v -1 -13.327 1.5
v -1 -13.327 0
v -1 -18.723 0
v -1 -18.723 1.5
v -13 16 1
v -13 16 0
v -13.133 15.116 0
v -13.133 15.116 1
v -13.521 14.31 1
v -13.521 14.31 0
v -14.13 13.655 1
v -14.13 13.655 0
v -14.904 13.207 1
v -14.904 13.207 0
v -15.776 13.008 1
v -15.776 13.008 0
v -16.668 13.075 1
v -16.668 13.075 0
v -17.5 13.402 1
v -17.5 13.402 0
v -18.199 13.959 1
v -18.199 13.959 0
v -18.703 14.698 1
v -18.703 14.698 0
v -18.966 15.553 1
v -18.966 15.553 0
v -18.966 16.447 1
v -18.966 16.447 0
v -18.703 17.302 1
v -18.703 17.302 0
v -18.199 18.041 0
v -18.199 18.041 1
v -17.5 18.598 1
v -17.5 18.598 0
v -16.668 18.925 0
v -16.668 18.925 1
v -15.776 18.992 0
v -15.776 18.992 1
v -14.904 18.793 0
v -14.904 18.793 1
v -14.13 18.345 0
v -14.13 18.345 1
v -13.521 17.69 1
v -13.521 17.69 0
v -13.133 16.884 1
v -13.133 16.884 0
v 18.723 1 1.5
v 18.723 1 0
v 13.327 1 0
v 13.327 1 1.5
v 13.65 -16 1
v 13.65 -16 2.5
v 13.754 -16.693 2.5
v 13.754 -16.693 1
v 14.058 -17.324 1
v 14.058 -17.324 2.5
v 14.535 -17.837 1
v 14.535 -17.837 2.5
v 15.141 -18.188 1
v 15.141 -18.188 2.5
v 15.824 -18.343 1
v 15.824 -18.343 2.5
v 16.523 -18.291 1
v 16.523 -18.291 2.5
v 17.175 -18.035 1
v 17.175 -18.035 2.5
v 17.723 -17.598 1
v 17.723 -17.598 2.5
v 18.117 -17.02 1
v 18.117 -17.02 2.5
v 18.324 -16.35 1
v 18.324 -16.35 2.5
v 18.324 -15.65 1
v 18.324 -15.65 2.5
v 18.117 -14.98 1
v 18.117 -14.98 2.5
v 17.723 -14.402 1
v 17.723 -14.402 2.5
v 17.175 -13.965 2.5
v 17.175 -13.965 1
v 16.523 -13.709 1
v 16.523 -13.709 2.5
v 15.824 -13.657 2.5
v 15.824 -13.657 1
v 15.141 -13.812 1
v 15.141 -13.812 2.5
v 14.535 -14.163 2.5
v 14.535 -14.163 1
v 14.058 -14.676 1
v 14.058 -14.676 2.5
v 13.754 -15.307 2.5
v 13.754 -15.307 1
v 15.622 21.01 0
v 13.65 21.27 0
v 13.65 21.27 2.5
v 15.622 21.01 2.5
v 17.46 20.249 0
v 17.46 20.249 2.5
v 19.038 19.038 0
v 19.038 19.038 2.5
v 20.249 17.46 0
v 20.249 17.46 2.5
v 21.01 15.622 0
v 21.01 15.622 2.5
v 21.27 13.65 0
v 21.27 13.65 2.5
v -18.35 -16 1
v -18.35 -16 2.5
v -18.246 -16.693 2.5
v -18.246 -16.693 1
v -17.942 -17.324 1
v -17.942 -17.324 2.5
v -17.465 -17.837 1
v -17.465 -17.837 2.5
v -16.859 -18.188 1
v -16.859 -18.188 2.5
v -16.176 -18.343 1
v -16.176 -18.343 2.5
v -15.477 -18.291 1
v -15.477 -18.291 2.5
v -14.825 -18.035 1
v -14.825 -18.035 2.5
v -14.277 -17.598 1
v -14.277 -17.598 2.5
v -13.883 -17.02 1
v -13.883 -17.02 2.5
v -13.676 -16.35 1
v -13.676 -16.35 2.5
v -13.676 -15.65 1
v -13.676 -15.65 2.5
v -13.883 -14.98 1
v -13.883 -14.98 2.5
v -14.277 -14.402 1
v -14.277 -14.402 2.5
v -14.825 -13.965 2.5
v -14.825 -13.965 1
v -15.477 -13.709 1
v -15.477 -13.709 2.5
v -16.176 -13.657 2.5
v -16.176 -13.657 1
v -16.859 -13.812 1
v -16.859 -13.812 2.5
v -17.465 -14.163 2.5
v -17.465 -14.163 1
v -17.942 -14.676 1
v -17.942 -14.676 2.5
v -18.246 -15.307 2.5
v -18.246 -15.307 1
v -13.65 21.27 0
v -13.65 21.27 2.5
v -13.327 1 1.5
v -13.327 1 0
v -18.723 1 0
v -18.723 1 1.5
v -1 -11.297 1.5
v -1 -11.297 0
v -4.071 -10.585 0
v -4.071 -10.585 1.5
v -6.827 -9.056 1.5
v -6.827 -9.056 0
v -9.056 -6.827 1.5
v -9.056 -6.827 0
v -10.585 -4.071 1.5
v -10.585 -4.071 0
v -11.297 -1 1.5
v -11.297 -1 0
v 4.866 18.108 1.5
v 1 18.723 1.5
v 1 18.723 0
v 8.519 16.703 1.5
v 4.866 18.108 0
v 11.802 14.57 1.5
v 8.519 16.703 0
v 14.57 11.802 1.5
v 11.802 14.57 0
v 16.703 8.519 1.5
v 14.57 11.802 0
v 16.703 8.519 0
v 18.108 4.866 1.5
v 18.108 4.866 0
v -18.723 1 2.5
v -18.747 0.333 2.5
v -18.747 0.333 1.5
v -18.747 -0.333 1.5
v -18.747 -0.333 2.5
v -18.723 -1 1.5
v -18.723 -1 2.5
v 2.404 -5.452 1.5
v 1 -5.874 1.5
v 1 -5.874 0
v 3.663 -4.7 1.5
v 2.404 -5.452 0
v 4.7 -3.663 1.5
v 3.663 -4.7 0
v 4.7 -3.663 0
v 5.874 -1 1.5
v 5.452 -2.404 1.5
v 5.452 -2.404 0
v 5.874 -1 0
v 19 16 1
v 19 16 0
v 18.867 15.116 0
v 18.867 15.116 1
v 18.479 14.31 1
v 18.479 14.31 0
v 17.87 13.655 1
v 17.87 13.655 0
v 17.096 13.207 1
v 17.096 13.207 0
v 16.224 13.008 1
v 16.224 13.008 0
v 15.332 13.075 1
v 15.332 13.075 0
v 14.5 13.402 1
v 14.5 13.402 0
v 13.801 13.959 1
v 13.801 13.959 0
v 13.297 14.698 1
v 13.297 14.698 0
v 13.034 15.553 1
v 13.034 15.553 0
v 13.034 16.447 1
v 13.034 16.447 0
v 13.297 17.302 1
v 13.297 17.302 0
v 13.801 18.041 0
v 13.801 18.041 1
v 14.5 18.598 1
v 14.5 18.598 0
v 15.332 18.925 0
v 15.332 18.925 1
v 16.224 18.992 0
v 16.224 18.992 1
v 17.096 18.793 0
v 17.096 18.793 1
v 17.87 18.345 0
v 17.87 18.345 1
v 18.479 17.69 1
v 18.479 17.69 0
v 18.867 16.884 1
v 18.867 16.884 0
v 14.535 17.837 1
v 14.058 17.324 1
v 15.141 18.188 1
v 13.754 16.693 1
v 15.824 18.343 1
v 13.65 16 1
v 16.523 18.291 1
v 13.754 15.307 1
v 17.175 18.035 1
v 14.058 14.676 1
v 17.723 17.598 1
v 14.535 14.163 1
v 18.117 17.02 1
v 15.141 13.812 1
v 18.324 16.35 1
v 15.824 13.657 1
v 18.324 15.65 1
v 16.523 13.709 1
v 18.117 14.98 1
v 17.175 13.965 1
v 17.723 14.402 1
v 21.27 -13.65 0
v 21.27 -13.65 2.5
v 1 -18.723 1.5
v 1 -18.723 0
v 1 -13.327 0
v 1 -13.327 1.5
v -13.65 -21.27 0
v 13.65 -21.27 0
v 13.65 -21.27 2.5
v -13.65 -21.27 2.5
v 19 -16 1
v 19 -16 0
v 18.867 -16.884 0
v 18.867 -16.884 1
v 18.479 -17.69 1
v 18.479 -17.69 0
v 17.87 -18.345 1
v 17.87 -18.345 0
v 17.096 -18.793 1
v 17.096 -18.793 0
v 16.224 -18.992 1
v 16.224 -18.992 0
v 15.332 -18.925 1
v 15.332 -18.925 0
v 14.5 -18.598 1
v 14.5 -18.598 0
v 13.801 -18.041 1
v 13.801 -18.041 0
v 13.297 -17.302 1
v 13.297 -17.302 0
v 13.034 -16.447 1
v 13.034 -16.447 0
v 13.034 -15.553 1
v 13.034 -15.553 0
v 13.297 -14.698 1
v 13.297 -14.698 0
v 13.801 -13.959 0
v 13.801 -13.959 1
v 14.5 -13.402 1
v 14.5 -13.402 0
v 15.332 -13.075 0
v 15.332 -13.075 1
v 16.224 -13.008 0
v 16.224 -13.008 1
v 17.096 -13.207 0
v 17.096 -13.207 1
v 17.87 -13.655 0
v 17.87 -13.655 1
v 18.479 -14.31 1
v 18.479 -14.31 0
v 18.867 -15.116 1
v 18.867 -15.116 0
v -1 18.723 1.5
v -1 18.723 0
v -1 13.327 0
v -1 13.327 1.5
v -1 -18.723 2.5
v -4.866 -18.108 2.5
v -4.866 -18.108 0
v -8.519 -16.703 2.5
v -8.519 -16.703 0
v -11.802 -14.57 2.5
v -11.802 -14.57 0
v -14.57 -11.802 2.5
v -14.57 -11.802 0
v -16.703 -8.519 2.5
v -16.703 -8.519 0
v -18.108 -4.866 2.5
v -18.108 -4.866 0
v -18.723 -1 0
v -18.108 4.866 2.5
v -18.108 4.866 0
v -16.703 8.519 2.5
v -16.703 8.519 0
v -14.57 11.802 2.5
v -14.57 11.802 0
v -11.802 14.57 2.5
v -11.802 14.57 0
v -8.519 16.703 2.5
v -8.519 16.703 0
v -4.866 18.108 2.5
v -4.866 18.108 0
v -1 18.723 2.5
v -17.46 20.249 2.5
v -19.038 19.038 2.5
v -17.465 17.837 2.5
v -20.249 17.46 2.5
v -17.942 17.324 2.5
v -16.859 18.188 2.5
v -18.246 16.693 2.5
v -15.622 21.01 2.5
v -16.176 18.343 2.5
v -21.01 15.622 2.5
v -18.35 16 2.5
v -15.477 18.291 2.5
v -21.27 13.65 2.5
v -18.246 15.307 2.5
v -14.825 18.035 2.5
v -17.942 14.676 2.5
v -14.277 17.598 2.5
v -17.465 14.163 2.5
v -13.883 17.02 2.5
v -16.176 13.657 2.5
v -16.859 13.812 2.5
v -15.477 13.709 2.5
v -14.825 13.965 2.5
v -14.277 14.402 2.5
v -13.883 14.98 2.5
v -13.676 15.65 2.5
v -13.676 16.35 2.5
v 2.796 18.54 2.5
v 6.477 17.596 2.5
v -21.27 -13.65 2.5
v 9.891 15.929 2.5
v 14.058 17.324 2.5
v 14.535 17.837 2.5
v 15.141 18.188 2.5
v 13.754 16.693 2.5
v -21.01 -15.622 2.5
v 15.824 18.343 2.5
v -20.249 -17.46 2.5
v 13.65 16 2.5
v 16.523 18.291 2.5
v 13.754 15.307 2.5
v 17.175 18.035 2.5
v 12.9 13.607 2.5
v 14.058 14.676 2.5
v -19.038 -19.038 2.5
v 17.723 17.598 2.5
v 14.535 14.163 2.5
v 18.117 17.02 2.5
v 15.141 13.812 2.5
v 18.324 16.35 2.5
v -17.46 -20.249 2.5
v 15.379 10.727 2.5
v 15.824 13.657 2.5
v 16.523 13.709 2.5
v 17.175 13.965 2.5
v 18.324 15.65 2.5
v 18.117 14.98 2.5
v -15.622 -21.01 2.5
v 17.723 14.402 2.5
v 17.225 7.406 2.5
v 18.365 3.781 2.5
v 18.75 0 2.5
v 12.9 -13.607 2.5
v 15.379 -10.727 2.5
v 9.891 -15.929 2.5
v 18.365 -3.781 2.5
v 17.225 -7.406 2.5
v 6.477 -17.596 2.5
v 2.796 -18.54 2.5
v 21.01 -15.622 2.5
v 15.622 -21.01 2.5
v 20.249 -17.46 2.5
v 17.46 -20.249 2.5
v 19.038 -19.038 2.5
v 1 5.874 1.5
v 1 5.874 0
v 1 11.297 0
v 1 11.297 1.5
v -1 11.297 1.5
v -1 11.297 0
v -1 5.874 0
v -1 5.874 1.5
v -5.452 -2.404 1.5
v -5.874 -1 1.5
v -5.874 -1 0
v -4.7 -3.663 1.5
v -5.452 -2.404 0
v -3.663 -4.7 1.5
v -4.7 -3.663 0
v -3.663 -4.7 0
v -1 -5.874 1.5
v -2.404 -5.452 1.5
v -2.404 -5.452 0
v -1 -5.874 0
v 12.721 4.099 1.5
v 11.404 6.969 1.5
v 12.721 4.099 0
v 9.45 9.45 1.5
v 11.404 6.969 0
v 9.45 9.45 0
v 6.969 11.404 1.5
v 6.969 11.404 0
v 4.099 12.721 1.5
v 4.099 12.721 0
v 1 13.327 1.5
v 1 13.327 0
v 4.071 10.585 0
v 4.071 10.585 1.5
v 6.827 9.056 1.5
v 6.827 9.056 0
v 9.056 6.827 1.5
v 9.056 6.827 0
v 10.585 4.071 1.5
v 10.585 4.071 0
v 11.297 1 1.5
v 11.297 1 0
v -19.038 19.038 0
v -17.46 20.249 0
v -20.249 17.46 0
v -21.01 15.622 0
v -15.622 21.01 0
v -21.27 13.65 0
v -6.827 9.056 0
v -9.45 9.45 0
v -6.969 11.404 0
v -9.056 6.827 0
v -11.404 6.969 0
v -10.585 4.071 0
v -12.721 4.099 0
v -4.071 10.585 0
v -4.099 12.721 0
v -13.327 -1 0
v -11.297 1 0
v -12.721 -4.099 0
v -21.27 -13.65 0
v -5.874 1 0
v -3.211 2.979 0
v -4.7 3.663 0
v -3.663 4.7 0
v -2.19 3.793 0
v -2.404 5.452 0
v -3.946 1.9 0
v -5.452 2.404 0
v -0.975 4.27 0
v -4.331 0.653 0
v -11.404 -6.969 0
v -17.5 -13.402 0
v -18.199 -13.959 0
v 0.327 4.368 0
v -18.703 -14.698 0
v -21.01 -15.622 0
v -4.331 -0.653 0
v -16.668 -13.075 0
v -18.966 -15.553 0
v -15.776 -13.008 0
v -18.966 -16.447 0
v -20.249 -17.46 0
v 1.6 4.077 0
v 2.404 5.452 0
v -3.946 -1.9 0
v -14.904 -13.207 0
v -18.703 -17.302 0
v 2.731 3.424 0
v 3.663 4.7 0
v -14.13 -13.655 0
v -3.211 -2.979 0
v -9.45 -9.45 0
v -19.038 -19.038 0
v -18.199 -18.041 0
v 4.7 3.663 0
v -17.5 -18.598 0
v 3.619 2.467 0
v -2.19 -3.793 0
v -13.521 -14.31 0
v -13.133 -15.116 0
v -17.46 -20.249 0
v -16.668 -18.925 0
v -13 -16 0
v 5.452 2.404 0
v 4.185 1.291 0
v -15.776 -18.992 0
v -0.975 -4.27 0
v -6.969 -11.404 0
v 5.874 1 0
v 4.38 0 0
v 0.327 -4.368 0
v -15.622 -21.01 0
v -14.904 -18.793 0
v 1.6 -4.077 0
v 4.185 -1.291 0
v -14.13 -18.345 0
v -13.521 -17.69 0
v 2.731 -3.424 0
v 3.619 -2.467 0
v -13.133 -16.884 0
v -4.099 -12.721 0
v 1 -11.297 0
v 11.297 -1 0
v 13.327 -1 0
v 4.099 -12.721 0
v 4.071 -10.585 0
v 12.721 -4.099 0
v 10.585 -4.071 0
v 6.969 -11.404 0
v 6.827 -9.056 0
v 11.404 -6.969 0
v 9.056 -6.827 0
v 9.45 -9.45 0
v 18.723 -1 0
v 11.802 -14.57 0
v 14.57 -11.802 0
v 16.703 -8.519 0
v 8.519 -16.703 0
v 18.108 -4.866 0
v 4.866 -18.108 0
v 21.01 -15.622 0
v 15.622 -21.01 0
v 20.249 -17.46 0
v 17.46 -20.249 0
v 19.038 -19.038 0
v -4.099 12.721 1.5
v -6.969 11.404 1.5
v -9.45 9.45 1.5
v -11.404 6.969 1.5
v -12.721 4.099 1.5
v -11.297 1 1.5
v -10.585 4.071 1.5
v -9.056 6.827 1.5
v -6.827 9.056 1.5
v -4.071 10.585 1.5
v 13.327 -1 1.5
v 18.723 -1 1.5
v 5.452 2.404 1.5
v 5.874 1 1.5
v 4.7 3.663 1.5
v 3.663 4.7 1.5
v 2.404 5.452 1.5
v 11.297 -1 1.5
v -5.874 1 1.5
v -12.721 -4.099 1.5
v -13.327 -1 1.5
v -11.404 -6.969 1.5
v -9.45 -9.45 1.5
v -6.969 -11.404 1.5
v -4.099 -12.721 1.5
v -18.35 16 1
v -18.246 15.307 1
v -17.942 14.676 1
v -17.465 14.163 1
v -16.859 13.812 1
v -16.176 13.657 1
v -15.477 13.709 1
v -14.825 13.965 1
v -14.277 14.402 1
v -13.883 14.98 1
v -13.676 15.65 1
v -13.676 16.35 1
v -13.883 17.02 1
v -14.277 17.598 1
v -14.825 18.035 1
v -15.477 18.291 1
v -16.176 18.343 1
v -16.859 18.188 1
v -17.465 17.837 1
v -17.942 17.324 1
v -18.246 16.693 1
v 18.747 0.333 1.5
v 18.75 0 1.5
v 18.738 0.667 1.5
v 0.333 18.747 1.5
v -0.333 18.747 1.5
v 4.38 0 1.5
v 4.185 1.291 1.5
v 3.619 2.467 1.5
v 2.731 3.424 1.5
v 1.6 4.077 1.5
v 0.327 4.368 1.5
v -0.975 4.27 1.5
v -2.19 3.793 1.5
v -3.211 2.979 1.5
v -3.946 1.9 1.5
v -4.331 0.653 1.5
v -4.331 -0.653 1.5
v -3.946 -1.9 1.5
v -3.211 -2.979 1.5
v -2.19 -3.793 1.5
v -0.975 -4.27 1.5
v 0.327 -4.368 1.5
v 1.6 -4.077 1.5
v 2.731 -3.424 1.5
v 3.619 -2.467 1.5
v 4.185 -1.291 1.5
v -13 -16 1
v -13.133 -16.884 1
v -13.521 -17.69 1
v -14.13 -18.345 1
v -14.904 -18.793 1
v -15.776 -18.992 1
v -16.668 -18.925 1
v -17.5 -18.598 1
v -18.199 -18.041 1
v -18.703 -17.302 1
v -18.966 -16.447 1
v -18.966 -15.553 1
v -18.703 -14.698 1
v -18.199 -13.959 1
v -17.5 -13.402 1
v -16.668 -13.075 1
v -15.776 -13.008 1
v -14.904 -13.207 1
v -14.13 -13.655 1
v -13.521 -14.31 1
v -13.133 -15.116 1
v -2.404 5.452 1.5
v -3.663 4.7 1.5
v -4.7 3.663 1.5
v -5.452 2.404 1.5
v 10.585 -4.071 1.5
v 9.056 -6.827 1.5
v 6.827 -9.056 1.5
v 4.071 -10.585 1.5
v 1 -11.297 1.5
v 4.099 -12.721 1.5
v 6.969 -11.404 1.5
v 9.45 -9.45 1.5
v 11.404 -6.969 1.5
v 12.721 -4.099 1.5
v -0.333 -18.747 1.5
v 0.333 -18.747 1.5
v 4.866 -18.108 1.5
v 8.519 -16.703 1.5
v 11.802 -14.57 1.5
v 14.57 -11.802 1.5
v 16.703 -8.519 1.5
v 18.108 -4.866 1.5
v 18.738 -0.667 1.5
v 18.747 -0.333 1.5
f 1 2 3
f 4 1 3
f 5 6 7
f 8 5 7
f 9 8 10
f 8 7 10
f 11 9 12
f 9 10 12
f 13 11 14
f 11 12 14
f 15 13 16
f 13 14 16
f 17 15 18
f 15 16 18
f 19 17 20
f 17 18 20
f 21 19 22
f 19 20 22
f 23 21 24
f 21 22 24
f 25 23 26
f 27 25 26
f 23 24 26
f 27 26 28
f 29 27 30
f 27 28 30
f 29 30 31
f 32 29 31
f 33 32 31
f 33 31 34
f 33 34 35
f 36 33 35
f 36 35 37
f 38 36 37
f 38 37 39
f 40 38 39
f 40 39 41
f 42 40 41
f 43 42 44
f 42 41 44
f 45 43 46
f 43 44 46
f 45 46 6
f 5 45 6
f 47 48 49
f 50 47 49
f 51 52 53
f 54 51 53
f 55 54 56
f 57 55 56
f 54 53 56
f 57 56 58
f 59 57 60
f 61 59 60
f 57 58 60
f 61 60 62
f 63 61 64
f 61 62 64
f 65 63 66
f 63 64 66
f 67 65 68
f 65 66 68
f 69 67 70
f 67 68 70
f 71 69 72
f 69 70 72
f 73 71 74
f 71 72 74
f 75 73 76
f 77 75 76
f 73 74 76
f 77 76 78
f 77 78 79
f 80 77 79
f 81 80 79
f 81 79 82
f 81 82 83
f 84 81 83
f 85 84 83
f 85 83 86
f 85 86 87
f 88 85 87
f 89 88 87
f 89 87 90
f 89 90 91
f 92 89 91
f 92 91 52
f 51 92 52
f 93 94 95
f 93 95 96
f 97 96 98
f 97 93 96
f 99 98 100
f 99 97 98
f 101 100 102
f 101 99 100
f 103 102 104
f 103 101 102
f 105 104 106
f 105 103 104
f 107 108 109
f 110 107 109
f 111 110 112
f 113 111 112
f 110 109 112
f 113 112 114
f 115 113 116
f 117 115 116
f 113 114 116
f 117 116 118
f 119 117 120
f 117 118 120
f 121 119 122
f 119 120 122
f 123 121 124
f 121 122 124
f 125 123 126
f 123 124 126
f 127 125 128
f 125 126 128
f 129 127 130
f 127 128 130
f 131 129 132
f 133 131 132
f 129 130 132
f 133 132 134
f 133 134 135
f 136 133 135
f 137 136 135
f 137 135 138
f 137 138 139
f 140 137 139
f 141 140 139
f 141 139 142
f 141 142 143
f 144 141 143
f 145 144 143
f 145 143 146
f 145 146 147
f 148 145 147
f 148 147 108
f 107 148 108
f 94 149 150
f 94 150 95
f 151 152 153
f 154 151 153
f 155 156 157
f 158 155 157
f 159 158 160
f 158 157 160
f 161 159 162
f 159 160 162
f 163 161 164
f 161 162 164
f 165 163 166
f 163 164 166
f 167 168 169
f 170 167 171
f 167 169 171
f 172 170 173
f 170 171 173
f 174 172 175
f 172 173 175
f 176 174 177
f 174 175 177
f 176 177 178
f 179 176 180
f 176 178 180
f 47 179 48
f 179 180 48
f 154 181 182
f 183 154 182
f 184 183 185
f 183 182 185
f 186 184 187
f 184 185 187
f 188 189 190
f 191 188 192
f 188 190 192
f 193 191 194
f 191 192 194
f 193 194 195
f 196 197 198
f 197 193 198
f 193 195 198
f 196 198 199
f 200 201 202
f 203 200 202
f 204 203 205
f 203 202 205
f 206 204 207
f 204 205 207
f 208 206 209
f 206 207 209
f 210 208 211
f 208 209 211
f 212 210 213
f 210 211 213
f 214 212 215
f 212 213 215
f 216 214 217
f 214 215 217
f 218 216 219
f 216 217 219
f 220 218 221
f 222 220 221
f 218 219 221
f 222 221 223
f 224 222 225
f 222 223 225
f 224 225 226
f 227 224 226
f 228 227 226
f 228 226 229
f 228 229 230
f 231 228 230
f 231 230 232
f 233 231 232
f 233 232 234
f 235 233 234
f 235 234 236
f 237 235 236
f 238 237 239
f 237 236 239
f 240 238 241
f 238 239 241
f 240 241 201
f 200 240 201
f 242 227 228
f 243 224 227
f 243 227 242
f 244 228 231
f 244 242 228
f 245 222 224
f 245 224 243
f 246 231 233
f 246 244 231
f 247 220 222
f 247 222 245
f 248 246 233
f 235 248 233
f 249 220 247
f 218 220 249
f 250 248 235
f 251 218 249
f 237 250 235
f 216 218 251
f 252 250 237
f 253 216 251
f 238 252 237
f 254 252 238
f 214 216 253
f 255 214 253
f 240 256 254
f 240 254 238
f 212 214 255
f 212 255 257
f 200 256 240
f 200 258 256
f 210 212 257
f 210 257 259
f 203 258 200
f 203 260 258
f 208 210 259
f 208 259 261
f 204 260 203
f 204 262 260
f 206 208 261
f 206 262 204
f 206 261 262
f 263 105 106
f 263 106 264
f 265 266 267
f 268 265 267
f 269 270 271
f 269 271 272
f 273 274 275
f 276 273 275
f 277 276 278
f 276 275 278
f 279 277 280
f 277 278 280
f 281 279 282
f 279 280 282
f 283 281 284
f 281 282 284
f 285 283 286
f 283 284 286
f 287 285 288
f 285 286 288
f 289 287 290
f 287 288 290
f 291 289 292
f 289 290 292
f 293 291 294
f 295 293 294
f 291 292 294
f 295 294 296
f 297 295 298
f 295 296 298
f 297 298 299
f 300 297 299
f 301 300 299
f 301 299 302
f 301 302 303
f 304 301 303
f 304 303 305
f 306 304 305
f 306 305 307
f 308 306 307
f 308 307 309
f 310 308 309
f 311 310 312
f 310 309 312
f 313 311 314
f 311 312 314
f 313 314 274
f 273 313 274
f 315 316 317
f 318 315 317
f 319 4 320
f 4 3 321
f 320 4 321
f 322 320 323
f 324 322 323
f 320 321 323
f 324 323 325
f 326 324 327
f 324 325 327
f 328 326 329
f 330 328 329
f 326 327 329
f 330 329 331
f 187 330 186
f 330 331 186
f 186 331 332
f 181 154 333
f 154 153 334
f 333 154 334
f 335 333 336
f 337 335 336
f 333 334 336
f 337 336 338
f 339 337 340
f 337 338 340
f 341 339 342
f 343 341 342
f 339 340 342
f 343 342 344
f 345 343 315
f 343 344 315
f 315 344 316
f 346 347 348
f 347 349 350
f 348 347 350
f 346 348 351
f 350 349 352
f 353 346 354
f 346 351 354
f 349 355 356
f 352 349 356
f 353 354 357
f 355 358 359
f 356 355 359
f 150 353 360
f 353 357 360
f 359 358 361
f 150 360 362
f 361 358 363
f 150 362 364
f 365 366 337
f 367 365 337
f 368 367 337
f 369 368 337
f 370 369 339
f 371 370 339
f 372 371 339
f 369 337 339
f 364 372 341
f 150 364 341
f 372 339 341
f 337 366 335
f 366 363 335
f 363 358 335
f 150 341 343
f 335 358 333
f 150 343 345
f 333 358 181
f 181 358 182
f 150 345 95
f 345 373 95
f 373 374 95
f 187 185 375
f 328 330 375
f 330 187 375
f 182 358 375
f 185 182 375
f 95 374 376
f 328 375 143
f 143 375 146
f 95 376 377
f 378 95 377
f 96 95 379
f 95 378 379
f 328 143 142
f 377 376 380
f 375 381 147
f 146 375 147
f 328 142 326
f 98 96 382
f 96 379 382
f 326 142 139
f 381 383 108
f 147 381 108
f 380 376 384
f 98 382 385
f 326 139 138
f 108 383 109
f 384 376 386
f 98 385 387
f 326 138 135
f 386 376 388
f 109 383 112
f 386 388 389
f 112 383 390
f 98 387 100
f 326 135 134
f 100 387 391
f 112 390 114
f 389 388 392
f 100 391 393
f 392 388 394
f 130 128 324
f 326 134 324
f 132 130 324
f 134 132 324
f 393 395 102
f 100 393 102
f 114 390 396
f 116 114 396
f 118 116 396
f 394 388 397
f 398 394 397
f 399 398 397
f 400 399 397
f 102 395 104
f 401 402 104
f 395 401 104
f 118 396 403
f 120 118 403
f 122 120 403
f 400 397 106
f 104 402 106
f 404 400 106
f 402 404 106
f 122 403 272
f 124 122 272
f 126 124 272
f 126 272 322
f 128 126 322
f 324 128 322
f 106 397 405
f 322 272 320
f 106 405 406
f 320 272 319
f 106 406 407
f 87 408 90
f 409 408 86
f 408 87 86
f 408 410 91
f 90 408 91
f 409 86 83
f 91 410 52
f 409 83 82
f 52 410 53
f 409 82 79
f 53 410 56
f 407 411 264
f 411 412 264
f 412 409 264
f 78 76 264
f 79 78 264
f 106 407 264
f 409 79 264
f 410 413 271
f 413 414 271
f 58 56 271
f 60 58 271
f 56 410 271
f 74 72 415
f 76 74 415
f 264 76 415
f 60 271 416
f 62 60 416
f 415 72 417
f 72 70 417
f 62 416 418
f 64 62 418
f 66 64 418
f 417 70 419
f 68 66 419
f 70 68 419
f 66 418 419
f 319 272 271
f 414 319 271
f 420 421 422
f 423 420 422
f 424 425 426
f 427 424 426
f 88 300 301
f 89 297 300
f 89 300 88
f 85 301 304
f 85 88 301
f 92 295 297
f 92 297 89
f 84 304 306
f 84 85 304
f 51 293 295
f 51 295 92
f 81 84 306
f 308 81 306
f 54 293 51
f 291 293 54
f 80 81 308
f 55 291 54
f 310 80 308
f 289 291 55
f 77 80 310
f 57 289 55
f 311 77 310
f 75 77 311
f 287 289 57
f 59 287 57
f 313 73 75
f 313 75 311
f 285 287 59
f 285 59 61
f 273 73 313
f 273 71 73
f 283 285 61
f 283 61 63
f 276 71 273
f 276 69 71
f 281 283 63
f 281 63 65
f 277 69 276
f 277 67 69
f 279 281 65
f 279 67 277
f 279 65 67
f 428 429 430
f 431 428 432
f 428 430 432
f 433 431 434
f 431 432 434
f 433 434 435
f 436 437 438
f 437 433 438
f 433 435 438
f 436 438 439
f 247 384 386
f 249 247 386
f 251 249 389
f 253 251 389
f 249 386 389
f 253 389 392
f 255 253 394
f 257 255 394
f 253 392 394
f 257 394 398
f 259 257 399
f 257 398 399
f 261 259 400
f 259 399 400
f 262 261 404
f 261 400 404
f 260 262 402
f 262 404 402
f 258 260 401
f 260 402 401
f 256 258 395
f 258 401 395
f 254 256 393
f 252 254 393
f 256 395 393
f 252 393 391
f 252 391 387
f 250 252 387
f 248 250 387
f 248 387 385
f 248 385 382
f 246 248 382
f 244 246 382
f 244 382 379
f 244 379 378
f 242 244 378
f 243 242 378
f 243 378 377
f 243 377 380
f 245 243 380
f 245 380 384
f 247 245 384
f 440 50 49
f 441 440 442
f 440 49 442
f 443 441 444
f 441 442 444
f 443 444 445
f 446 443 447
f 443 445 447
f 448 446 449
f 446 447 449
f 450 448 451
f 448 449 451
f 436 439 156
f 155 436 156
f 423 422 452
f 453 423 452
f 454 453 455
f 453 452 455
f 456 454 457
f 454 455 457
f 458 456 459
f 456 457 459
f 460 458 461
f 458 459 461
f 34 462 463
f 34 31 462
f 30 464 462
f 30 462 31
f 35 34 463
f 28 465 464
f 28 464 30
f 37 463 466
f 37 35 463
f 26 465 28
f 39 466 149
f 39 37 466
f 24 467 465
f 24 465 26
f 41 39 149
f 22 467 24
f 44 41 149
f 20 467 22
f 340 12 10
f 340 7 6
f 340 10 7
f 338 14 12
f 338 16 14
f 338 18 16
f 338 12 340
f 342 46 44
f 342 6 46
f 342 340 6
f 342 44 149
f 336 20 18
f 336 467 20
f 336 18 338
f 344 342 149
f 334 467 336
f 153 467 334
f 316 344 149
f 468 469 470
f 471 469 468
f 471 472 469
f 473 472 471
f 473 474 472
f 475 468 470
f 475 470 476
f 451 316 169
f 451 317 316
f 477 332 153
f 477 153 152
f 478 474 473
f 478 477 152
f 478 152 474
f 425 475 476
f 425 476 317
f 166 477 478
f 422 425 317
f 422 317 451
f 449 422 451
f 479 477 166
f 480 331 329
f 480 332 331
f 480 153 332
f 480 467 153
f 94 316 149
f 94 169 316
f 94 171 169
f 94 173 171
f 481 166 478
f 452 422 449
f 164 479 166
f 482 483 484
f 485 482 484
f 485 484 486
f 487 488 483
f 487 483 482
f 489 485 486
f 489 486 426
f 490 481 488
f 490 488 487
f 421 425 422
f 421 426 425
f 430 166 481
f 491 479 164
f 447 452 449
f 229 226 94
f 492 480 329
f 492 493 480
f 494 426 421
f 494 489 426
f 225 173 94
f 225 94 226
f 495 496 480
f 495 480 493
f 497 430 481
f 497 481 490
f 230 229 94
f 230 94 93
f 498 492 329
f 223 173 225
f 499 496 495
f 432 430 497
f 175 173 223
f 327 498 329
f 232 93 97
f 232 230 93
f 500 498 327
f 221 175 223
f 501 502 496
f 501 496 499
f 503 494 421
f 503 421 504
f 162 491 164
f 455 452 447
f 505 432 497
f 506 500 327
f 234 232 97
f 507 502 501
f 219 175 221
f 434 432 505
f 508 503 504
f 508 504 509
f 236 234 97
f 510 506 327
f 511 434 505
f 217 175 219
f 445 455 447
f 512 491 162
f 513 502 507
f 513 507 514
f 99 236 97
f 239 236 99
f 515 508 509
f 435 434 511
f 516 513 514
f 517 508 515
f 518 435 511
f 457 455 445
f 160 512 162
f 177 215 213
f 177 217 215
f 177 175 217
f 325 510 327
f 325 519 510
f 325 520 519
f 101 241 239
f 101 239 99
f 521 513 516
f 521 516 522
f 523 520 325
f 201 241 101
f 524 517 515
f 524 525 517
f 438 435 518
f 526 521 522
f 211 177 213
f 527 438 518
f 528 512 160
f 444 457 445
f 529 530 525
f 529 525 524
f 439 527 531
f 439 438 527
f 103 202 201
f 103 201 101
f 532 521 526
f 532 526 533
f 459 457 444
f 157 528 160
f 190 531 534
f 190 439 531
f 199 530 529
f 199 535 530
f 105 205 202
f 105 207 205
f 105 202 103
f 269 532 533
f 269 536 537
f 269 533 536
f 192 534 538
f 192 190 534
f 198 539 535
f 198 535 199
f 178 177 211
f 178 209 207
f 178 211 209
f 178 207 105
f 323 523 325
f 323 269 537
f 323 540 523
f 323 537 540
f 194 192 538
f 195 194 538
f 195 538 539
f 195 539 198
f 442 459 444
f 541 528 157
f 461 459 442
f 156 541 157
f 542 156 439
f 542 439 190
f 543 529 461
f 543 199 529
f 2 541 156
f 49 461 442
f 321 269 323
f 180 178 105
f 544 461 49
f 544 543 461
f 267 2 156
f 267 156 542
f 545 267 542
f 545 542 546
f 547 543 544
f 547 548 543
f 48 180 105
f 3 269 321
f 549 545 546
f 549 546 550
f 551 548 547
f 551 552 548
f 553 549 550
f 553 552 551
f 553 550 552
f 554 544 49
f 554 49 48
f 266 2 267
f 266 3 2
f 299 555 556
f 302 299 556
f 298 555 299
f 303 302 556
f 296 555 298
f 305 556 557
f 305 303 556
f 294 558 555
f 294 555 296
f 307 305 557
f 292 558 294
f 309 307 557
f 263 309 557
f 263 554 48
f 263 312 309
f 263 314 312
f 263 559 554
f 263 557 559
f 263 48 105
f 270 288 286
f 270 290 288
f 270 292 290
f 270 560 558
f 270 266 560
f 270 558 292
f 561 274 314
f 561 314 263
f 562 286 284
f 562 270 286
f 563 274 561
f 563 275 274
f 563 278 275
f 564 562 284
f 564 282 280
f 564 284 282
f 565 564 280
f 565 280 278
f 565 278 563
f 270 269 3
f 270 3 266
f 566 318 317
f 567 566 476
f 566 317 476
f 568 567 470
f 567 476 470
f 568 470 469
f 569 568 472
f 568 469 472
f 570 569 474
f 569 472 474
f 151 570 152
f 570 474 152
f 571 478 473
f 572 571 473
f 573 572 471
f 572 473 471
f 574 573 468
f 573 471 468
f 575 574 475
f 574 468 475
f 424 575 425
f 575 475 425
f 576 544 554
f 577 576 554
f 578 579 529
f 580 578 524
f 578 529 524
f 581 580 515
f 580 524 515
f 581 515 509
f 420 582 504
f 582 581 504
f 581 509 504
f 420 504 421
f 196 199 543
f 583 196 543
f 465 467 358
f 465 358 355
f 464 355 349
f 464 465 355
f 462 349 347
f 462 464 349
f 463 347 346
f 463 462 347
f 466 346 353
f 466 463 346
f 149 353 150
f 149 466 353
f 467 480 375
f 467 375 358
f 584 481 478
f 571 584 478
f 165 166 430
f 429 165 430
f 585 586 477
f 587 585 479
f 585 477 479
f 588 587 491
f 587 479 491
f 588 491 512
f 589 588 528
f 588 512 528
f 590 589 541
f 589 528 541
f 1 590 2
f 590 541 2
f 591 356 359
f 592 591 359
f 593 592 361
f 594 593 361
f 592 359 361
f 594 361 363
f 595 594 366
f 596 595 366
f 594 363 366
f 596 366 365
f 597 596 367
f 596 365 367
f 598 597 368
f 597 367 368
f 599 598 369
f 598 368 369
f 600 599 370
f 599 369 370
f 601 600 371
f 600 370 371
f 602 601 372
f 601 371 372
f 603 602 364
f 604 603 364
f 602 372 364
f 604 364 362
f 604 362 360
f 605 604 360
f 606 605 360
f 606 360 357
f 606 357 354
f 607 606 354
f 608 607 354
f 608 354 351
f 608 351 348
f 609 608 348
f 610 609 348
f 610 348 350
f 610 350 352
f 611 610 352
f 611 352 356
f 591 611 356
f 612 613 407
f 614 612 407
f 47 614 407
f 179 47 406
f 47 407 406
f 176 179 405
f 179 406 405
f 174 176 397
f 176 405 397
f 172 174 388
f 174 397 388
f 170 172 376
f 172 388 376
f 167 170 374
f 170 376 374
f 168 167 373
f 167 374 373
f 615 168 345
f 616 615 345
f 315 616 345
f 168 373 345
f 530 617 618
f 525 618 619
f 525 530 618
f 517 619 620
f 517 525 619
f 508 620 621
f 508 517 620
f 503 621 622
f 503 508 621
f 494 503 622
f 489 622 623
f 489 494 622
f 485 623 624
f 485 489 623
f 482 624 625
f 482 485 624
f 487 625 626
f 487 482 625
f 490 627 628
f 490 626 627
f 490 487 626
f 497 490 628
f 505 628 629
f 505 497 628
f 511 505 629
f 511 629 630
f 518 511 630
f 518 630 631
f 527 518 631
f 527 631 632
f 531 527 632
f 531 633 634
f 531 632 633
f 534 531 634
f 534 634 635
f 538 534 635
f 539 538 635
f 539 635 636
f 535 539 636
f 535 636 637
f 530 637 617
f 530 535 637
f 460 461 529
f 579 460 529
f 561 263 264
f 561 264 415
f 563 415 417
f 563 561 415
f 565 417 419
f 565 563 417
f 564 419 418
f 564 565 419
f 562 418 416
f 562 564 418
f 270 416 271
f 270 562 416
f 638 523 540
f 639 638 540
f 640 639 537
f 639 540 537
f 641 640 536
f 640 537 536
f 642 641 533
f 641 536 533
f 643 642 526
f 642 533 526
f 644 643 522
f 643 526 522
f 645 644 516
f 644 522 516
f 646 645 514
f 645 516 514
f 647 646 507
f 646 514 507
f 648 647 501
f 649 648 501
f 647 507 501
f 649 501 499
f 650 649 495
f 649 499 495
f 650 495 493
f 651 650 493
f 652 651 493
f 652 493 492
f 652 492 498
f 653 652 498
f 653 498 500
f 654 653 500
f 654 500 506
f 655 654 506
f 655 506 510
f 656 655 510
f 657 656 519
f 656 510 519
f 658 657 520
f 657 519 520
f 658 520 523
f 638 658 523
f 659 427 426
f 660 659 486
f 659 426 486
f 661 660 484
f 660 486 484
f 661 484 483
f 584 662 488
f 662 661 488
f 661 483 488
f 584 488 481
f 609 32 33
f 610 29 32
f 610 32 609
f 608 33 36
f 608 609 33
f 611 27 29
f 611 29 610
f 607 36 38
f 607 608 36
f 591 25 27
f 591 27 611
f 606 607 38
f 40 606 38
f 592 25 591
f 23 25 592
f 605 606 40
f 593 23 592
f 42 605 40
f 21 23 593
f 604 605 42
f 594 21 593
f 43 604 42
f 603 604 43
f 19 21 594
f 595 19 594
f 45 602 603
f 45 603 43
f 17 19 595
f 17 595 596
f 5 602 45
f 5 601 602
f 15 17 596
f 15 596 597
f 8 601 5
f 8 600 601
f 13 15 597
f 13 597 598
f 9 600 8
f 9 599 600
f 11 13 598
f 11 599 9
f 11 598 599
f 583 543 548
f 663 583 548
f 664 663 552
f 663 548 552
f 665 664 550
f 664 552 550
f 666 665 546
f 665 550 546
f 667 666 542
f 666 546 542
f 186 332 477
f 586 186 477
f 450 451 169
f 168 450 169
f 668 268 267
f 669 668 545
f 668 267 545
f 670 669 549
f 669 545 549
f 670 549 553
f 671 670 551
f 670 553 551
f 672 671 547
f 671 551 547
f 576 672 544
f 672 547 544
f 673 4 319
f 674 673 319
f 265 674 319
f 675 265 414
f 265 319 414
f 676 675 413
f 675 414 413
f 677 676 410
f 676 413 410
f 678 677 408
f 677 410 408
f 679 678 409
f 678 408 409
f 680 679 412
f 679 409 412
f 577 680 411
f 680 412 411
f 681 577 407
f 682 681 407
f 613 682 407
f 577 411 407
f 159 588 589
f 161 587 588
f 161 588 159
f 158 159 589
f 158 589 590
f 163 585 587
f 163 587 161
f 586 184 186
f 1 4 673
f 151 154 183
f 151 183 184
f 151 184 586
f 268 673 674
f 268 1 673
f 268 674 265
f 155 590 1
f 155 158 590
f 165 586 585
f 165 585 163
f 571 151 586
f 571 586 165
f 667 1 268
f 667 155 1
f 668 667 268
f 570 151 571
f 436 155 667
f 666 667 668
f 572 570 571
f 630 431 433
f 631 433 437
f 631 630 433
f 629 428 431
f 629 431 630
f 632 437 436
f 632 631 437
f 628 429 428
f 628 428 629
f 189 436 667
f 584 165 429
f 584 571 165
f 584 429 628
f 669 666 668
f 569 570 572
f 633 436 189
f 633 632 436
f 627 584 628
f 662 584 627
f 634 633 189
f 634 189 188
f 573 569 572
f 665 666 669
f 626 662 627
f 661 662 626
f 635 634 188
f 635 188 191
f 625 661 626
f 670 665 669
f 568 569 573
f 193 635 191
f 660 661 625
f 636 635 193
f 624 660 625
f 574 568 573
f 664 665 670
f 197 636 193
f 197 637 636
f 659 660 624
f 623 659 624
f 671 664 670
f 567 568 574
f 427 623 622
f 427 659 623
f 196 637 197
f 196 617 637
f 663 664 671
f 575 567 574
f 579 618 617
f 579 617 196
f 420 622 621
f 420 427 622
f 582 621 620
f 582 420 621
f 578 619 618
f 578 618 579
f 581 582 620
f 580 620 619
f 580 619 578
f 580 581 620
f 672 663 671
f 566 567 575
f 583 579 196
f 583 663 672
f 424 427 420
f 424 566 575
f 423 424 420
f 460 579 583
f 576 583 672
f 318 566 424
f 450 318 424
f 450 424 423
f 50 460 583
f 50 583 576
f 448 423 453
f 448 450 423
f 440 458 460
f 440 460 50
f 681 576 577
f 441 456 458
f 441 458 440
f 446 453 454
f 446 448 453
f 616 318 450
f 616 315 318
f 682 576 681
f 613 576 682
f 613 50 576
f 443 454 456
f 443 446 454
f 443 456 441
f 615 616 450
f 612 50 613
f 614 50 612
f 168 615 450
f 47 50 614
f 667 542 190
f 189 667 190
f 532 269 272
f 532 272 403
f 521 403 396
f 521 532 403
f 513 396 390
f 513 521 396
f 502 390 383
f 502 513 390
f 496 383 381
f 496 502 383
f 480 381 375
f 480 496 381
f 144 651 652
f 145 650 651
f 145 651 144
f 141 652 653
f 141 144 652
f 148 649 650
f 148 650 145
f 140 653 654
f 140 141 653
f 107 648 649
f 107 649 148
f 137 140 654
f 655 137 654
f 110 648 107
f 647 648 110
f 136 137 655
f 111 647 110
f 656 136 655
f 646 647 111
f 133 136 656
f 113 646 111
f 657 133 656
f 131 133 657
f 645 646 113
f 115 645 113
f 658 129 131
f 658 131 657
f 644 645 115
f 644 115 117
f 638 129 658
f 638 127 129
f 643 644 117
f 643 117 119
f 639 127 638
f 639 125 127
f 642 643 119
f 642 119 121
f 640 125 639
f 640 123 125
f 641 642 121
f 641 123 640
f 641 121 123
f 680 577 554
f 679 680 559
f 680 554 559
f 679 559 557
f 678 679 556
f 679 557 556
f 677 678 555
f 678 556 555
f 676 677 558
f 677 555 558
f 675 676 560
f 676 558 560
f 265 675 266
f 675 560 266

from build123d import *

# Parameters (mm, degrees)
F0_R     = 1.6
F0_R_2   = 4.38006
F1_DEPTH = 2.5
F3_DEPTH = 1
F4_R     = 3
F4_R_2   = 1.6
F5_DEPTH = 1
F7_DEPTH = 2.5
F8_R     = 1.7
F9_DEPTH = 2.501
F10_D    = 4.7


with BuildPart() as f1:
    # F0 (on Top) → F1 (new body)
    with BuildSketch(Plane.XY):
        with BuildLine():
            Line((13.65, 20), (-13.65, 20))
            ThreePointArc((-13.65, 20), (-18.140128, 18.140128), (-20, 13.65))
            Line((-20, 13.65), (-20, -13.65))
            ThreePointArc((-20, -13.65), (-18.140128, -18.140128), (-13.65, -20))
            Line((-13.65, -20), (13.65, -20))
            ThreePointArc((13.65, -20), (18.140128, -18.140128), (20, -13.65))
            Line((20, -13.65), (20, 13.65))
            ThreePointArc((20, 13.65), (18.140128, 18.140128), (13.65, 20))
        make_face()
        with Locations((-16, -16)):
            Circle(F0_R, mode=Mode.SUBTRACT)
        with BuildLine():
            ThreePointArc((-1, -18.723314), (-13.258252, -13.258252), (-18.723314, -1))
            Line((-18.723314, -1), (-13.327216, -1))
            ThreePointArc((-13.327216, -1), (-9.450256, -9.450256), (-1, -13.327216))
            Line((-1, -13.327216), (-1, -18.723314))
        make_face(mode=Mode.SUBTRACT)
        with BuildLine():
            ThreePointArc((-5.873836, -1), (-4.213191, -4.213191), (-1, -5.873836))
            Line((-1, -5.873836), (-1, -11.296782))
            ThreePointArc((-1, -11.296782), (-8.019267, -8.019267), (-11.296782, -1))
            Line((-11.296782, -1), (-5.873836, -1))
        make_face(mode=Mode.SUBTRACT)
        with Locations((16, -16)):
            Circle(F0_R, mode=Mode.SUBTRACT)
        with BuildLine():
            ThreePointArc((18.723314, -1), (13.258252, -13.258252), (1, -18.723314))
            Line((1, -18.723314), (1, -13.327216))
            ThreePointArc((1, -13.327216), (9.450256, -9.450256), (13.327216, -1))
            Line((13.327216, -1), (18.723314, -1))
        make_face(mode=Mode.SUBTRACT)
        with BuildLine():
            ThreePointArc((1, -5.873836), (4.213191, -4.213191), (5.873836, -1))
            Line((5.873836, -1), (11.296782, -1))
            ThreePointArc((11.296782, -1), (8.019267, -8.019267), (1, -11.296782))
            Line((1, -11.296782), (1, -5.873836))
        make_face(mode=Mode.SUBTRACT)
        with BuildLine():
            ThreePointArc((-11.296782, 1), (-8.019267, 8.019267), (-1, 11.296782))
            Line((-1, 11.296782), (-1, 5.873836))
            ThreePointArc((-1, 5.873836), (-4.213191, 4.213191), (-5.873836, 1))
            Line((-5.873836, 1), (-11.296782, 1))
        make_face(mode=Mode.SUBTRACT)
        with BuildLine():
            ThreePointArc((-18.723314, 1), (-13.258252, 13.258252), (-1, 18.723314))
            Line((-1, 18.723314), (-1, 13.327216))
            ThreePointArc((-1, 13.327216), (-9.450256, 9.450256), (-13.327216, 1))
            Line((-13.327216, 1), (-18.723314, 1))
        make_face(mode=Mode.SUBTRACT)
        with Locations((-16, 16)):
            Circle(F0_R, mode=Mode.SUBTRACT)
        Circle(F0_R_2, mode=Mode.SUBTRACT)
        with BuildLine():
            Line((11.296782, 1), (5.873836, 1))
            ThreePointArc((5.873836, 1), (4.213191, 4.213191), (1, 5.873836))
            Line((1, 5.873836), (1, 11.296782))
            ThreePointArc((1, 11.296782), (8.019267, 8.019267), (11.296782, 1))
        make_face(mode=Mode.SUBTRACT)
        with BuildLine():
            Line((1, 13.327216), (1, 18.723314))
            ThreePointArc((1, 18.723314), (13.258252, 13.258252), (18.723314, 1))
            Line((18.723314, 1), (13.327216, 1))
            ThreePointArc((13.327216, 1), (9.450256, 9.450256), (1, 13.327216))
        make_face(mode=Mode.SUBTRACT)
        with Locations((16, 16)):
            Circle(F0_R, mode=Mode.SUBTRACT)
    extrude(amount=F1_DEPTH)

    # F2 (on face) → F3 (cut)
    with BuildSketch(Plane.XY.offset(2.5)):
        with BuildLine():
            ThreePointArc((18.75, 0), (12.899855, 13.607213), (-1, 18.723314))
            ThreePointArc((-1, 18.723314), (-13.258252, 13.258252), (-18.723314, 1))
            ThreePointArc((-18.723314, 1), (-18.75, 0), (-18.723314, -1))
            ThreePointArc((-18.723314, -1), (-13.258252, -13.258252), (-1, -18.723314))
            ThreePointArc((-1, -18.723314), (12.899855, -13.607213), (18.75, 0))
        make_face()
    extrude(amount=-F3_DEPTH, mode=Mode.SUBTRACT)

    # F4 (on face) → F5 (cut)
    with BuildSketch(Plane(origin=(0, 0, 0), x_dir=(1, 0, 0), z_dir=(0, 0, -1))):
        with Locations((-16, 16)):
            Circle(F4_R)
        with Locations((-16, 16)):
            Circle(F4_R_2, mode=Mode.SUBTRACT)
        with Locations((16, 16)):
            Circle(F4_R)
        with Locations((16, 16)):
            Circle(F4_R_2, mode=Mode.SUBTRACT)
        with Locations((16, -16)):
            Circle(F4_R)
        with Locations((16, -16)):
            Circle(F4_R_2, mode=Mode.SUBTRACT)
        with Locations((-16, -16)):
            Circle(F4_R)
        with Locations((-16, -16)):
            Circle(F4_R_2, mode=Mode.SUBTRACT)
    extrude(amount=-F5_DEPTH, mode=Mode.SUBTRACT)

    # F6 (on face) → F7 (join, through all)
    with BuildSketch(Plane(origin=(0, 0, 0), x_dir=(1, 0, 0), z_dir=(0, 0, -1))):
        with BuildLine():
            ThreePointArc((-13.65, 21.27), (-19.038154, 19.038154), (-21.27, 13.65))
            Line((-21.27, 13.65), (-21.27, -13.65))
            ThreePointArc((-21.27, -13.65), (-19.038154, -19.038154), (-13.65, -21.27))
            Line((-13.65, -21.27), (13.65, -21.27))
            ThreePointArc((13.65, -21.27), (19.038154, -19.038154), (21.27, -13.65))
            Line((21.27, -13.65), (21.27, 13.65))
            ThreePointArc((21.27, 13.65), (19.038154, 19.038154), (13.65, 21.27))
            Line((13.65, 21.27), (-13.65, 21.27))
        make_face()
        with BuildLine():
            ThreePointArc((-20, 13.65), (-18.140128, 18.140128), (-13.65, 20))
            Line((-13.65, 20), (13.65, 20))
            ThreePointArc((13.65, 20), (18.140128, 18.140128), (20, 13.65))
            Line((20, 13.65), (20, -13.65))
            ThreePointArc((20, -13.65), (18.140128, -18.140128), (13.65, -20))
            Line((13.65, -20), (-13.65, -20))
            ThreePointArc((-13.65, -20), (-18.140128, -18.140128), (-20, -13.65))
            Line((-20, -13.65), (-20, 13.65))
        make_face(mode=Mode.SUBTRACT)
    extrude(amount=-F7_DEPTH)

    # F8 (on face) → F9 (cut, through all)
    with BuildSketch(Plane.XY.offset(2.5)):
        with Locations((16, 16)):
            Circle(F8_R)
        with Locations((16, -16)):
            Circle(F8_R)
        with Locations((-16, -16)):
            Circle(F8_R)
        with Locations((-16, 16)):
            Circle(F8_R)
    extrude(amount=-F9_DEPTH, mode=Mode.SUBTRACT)

    # F10 (through all)
    with Locations(Plane(origin=(0, 0, 0), x_dir=(1, 0, 0), z_dir=(0, 0, -1))):
        with Locations((-16, -16), (16, -16), (16, 16), (-16, 16)):
            Hole(F10_D / 2)


solid = f1.part
